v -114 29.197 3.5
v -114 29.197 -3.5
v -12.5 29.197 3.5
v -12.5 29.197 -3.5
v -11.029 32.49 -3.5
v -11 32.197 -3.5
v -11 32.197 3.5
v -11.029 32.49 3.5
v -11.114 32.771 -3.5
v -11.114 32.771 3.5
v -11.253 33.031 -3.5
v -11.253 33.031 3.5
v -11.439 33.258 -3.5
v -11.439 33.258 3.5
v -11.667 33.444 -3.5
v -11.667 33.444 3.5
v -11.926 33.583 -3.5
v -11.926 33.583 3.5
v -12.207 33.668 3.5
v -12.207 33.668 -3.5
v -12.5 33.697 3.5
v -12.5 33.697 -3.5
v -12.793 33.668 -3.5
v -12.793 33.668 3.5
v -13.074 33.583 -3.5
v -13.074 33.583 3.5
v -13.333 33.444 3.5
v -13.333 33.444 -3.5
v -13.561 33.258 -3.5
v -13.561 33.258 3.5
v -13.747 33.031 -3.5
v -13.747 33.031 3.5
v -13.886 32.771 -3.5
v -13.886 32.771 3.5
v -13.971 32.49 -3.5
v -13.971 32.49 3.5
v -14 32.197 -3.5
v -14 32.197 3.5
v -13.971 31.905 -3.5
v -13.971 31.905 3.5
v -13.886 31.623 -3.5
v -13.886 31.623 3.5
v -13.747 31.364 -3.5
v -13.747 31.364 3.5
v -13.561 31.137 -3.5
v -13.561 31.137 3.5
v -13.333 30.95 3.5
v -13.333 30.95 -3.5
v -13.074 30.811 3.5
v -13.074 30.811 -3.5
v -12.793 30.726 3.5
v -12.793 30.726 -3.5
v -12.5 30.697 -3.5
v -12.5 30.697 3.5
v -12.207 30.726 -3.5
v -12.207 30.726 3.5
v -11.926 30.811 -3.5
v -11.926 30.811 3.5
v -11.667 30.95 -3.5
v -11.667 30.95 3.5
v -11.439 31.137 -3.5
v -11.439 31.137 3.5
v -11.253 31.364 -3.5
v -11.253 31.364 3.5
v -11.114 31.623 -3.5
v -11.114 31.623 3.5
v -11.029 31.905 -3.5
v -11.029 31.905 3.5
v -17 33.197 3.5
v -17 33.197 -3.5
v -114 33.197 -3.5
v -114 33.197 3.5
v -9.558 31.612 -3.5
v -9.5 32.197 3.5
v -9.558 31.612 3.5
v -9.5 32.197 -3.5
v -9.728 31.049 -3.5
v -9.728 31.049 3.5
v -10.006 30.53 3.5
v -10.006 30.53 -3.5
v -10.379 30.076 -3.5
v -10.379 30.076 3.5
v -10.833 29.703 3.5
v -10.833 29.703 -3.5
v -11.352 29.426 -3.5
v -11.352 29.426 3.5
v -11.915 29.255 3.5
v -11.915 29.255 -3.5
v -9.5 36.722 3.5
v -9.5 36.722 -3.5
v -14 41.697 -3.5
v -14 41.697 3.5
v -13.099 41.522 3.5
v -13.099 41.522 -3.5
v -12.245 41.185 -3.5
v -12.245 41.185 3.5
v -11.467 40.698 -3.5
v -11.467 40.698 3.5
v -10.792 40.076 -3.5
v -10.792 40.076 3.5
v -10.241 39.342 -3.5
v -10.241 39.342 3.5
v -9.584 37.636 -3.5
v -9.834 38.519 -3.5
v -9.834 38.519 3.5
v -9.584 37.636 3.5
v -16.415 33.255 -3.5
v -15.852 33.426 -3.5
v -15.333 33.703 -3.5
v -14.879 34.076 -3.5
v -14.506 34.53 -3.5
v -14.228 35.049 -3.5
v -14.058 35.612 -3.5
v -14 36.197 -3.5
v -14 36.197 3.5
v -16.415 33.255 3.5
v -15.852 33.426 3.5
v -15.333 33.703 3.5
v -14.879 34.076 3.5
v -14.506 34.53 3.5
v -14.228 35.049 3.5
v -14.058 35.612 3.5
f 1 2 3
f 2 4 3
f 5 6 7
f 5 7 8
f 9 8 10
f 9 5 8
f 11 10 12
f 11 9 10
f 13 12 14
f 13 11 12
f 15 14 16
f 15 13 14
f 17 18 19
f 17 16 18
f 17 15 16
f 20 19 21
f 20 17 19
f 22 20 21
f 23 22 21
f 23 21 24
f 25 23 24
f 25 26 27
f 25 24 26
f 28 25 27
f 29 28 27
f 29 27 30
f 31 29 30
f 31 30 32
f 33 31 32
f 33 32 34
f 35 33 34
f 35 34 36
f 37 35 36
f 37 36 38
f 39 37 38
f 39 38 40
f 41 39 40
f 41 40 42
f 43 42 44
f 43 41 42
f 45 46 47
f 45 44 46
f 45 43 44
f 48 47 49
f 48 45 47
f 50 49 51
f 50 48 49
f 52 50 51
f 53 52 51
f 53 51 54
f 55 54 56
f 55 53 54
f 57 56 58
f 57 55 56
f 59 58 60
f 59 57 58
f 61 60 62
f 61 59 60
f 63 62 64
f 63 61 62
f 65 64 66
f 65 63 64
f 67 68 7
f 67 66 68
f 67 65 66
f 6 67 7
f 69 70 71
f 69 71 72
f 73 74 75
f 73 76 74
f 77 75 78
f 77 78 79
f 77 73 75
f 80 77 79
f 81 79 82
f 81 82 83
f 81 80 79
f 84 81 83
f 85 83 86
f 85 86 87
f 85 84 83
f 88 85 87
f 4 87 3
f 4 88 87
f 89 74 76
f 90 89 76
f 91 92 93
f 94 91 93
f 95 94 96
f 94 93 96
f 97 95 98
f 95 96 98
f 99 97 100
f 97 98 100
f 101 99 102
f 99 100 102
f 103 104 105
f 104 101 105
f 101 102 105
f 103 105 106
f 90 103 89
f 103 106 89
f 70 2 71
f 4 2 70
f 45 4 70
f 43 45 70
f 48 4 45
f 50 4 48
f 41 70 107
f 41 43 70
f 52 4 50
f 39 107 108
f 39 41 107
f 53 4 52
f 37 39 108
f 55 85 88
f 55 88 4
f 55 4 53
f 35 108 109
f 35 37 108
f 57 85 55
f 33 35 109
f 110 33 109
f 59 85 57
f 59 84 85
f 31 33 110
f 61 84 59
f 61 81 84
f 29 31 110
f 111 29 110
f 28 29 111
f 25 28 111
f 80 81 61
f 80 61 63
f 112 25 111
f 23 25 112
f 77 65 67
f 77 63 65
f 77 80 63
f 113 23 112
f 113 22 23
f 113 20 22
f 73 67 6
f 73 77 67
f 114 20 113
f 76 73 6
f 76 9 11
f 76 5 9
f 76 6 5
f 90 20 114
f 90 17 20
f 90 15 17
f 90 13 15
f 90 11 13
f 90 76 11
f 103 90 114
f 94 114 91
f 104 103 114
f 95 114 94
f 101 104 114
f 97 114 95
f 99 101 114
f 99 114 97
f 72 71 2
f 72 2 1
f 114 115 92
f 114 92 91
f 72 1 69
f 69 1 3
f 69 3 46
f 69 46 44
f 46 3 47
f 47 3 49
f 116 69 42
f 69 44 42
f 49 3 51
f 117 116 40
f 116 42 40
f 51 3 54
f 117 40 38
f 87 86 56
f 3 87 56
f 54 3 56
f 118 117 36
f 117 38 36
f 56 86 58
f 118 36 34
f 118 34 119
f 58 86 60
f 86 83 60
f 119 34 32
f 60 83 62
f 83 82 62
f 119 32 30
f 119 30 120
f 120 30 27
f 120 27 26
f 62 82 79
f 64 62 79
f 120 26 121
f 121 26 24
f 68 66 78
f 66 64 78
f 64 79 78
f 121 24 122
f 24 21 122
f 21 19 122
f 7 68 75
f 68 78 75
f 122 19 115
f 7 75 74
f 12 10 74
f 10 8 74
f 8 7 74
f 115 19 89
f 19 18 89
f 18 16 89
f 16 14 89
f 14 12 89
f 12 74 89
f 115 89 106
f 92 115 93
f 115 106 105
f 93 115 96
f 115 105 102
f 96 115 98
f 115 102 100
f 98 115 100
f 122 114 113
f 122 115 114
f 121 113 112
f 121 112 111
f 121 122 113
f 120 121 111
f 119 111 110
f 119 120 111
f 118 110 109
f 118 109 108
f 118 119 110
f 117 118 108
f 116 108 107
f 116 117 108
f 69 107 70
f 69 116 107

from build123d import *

# Parameters (mm, degrees)
EXTRUDE_1_DEPTH          = 5
EXTRUDE_1_DEPTH_BACK     = 7.5
SKETCH_1_W               = 4.5
SKETCH_1_H               = 7
SKETCH_2_W               = 4.5
SKETCH_2_H               = 7
EXTRUDE_2_DEPTH          = 4
FILLET_1_R               = 3
SKETCH_3_W               = 7
SKETCH_3_H               = 4
EXTRUDE_3_DEPTH          = 100
FILLET_2_R               = 5
FILLET_3_R               = 3
CUT_EXTRUDE_1_DEPTH      = 122.436842092
CUT_EXTRUDE_1_DEPTH_BACK = 122.436842092
SKETCH_6_R               = 1.5


with BuildPart() as part:
    # Эскиз1 → Бобышка-Вытянуть1 (new, two sides: drawn at the far end of the back side and taken through both)
    with BuildSketch(Plane(origin=(0, 36.697201552, 0), x_dir=(1, 0, 0), z_dir=(0, 1, 0)).offset(-EXTRUDE_1_DEPTH_BACK)):
        with Locations((-11.75, 0)):
            Rectangle(SKETCH_1_W, SKETCH_1_H)
    extrude(amount=EXTRUDE_1_DEPTH + EXTRUDE_1_DEPTH_BACK)

    # Эскиз2 → Бобышка-Вытянуть2 (add)
    with BuildSketch(Plane.XZ.offset(-29.197201552)):
        with Locations((-11.75, 0)):
            Rectangle(SKETCH_2_W, SKETCH_2_H)
    extrude(amount=-EXTRUDE_2_DEPTH)

    # Скругление1
    fillet_1_edges = [part.edges().sort_by_distance(p)[0] for p in [
        (-9.5, 29.197201552, 0),
    ]]
    fillet(fillet_1_edges, radius=FILLET_1_R)

    # Эскиз3 → Бобышка-Вытянуть3 (add)
    with BuildSketch(Plane.ZY.offset(14)):
        with Locations((0, 31.197201552)):
            Rectangle(SKETCH_3_W, SKETCH_3_H)
    extrude(amount=EXTRUDE_3_DEPTH)

    # Скругление2
    # the kernel refuses this fillet: 5 mm, written as the material it takes off along each edge
    with BuildSketch(Plane(origin=(-9.5, 41.697201552, 15.937342964), x_dir=(-1, 0, 0), z_dir=(0, 0, -1))) as fillet_2_piece_1:
        with BuildLine():
            CenterArc((5, -4.974937186), FILLET_2_R, 95.739170477, 84.260829523)
            Line((0, -4.974937186), (-0.1, -4.974937186))
            Line((-0.1, -4.974937186), (-0.1, 0))
            Line((-0.1, 0), (0, 0.1))
            ThreePointArc((0, 0.1), (2.25, 0.1), (4.49, 0.099498744))
            Line((4.49, 0.099498744), (4.5, 0))
        make_face()
    extrude(amount=31.874685928, mode=Mode.SUBTRACT)

    # Скругление3
    fillet_3_edges = [part.edges().sort_by_distance(p)[0] for p in [
        (-14, 33.197201552, 0),
    ]]
    fillet(fillet_3_edges, radius=FILLET_3_R)

    # Эскиз6 → Вырез-Вытянуть1 (cut, two sides: drawn at the far end of the back side and taken through both)
    with BuildSketch(Plane.XY.offset(-CUT_EXTRUDE_1_DEPTH_BACK)):
        with Locations((-12.5, 32.197201552)):
            Circle(SKETCH_6_R)
    extrude(amount=CUT_EXTRUDE_1_DEPTH + CUT_EXTRUDE_1_DEPTH_BACK, mode=Mode.SUBTRACT)


solid = part.part
